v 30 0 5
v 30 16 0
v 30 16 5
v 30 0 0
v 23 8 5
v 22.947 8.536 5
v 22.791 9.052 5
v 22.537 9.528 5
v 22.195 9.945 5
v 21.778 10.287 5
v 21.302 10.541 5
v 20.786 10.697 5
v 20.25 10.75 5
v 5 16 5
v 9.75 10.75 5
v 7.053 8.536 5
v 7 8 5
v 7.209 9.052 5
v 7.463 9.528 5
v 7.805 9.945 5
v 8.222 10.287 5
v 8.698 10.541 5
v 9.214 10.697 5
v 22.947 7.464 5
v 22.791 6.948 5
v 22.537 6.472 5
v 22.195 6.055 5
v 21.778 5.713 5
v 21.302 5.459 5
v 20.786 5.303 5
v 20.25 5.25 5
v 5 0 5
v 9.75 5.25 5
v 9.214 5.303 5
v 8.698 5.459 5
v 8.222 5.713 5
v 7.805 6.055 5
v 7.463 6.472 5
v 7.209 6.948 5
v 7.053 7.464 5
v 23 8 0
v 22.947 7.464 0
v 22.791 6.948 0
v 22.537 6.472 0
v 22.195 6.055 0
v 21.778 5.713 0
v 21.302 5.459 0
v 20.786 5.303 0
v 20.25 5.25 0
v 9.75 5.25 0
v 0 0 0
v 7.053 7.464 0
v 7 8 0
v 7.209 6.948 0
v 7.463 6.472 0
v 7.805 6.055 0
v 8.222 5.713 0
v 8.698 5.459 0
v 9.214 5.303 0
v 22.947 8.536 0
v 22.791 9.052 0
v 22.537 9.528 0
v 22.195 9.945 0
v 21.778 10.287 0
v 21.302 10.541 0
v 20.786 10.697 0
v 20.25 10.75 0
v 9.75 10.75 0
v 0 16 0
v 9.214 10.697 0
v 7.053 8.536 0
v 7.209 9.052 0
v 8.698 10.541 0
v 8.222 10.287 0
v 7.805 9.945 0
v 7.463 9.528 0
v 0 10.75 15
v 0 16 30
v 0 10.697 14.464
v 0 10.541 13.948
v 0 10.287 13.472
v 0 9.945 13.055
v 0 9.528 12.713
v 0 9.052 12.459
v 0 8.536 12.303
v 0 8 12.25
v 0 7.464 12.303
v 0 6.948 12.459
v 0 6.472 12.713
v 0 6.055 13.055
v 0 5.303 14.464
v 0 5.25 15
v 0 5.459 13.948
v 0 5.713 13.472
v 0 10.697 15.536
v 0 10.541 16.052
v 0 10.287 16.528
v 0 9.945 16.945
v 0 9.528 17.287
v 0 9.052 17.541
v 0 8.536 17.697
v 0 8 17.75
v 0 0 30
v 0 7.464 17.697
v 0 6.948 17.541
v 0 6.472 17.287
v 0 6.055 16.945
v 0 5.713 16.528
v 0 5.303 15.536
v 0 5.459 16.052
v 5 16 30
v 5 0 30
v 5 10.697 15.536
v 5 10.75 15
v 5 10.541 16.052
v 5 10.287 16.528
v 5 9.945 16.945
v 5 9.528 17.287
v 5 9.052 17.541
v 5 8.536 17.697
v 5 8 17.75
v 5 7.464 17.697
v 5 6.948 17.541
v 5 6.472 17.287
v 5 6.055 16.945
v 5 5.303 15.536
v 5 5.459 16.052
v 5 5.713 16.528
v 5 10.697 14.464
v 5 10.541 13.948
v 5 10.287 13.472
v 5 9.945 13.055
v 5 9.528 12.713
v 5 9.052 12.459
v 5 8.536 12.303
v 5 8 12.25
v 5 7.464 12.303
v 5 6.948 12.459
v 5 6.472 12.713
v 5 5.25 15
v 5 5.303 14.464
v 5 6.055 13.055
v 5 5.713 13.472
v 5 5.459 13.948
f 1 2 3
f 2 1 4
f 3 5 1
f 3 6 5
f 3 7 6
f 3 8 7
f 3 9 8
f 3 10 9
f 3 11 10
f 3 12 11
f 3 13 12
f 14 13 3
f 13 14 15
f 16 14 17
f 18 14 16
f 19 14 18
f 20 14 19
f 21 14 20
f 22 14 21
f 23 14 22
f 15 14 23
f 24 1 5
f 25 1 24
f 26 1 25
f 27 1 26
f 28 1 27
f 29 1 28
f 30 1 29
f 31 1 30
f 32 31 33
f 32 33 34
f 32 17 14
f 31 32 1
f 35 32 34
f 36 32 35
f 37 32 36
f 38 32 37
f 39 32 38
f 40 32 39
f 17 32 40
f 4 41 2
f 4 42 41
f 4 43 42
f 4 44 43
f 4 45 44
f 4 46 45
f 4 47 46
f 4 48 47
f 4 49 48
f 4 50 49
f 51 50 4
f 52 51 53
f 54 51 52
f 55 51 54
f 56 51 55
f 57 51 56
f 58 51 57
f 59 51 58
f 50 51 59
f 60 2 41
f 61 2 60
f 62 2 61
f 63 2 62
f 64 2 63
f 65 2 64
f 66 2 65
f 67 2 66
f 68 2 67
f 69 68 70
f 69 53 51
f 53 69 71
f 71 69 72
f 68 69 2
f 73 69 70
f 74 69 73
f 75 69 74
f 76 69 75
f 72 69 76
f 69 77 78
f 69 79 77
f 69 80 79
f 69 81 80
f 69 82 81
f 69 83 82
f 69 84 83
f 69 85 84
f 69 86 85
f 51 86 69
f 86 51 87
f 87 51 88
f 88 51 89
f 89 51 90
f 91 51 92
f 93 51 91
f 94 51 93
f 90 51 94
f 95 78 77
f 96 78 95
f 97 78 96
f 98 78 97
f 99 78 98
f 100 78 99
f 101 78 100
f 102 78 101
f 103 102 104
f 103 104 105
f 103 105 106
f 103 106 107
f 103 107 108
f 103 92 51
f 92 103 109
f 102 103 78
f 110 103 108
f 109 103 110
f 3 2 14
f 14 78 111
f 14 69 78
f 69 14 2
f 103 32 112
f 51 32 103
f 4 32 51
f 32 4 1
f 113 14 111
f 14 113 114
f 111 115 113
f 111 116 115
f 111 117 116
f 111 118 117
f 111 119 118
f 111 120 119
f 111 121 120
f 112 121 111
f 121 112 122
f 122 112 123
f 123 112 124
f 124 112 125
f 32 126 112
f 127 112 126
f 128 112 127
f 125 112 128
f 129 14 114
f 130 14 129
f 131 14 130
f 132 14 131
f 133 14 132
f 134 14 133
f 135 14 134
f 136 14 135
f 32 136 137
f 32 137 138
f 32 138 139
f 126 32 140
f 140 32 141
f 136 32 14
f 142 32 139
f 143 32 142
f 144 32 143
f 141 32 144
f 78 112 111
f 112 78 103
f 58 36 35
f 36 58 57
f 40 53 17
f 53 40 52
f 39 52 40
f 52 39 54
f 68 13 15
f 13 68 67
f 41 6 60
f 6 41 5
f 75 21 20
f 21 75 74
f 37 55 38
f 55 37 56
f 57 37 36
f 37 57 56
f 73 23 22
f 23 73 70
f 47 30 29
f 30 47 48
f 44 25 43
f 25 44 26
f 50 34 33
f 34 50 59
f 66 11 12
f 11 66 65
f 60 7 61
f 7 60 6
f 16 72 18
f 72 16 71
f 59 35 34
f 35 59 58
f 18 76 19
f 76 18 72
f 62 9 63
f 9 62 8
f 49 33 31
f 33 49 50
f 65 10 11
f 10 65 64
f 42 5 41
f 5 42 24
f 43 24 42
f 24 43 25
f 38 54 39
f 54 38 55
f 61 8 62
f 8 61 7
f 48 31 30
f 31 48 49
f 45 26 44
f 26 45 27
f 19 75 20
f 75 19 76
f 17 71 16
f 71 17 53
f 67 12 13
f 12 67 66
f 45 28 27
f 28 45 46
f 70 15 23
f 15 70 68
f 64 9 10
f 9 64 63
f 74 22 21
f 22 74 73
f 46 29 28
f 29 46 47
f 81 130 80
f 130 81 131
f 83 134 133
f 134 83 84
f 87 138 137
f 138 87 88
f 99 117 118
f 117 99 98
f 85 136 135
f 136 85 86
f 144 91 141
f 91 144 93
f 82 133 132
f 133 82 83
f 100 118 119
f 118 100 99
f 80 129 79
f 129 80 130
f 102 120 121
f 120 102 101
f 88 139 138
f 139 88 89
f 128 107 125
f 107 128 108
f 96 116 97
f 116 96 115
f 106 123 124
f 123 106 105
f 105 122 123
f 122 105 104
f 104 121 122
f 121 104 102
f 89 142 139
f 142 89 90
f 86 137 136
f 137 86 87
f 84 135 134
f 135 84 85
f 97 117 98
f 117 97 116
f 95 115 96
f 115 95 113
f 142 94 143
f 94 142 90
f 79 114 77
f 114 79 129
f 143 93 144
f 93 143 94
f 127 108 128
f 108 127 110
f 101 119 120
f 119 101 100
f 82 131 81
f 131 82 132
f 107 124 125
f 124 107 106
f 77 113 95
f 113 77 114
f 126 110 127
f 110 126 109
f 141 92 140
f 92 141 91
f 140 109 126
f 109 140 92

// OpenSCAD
$fn = 32;

// ----------------------------------------------------------------------
// L-bracket: 30 x 16 x 30 mm
// ----------------------------------------------------------------------

// --- parameters (mm) ---
horiz_len = 30;           // horizontal leg, X
vert_len = 30;            // vertical leg, Z
profile_w = 16;           // bracket depth, Y
plate_t = 5;              // plate thickness
hole_d = 5.5;             // clearance for M5
slot_l = 16;              // adjustment slot length

module hole_z(px, py) {
  translate([px, py, -2.5]) cylinder(h = plate_t + 5, d = hole_d);
}
module hole_x(pz, py) {
  translate([-2.5, py, pz]) rotate([0, 90, 0]) cylinder(h = plate_t + 5, d = hole_d);
}
module adjust_slot(px, py) {
  hull() {
    translate([px - (slot_l - hole_d) / 2, py, -2.5]) cylinder(h = plate_t + 5, d = hole_d);
    translate([px + (slot_l - hole_d) / 2, py, -2.5]) cylinder(h = plate_t + 5, d = hole_d);
  }
}

difference() {
  union() {
    /* horizontal leg */
    cube([horiz_len, profile_w, plate_t]);
    /* vertical leg, overlapping the corner block */
    cube([plate_t, profile_w, vert_len]);
  }
  adjust_slot(15, 8);
  hole_x(15, 8);
}
